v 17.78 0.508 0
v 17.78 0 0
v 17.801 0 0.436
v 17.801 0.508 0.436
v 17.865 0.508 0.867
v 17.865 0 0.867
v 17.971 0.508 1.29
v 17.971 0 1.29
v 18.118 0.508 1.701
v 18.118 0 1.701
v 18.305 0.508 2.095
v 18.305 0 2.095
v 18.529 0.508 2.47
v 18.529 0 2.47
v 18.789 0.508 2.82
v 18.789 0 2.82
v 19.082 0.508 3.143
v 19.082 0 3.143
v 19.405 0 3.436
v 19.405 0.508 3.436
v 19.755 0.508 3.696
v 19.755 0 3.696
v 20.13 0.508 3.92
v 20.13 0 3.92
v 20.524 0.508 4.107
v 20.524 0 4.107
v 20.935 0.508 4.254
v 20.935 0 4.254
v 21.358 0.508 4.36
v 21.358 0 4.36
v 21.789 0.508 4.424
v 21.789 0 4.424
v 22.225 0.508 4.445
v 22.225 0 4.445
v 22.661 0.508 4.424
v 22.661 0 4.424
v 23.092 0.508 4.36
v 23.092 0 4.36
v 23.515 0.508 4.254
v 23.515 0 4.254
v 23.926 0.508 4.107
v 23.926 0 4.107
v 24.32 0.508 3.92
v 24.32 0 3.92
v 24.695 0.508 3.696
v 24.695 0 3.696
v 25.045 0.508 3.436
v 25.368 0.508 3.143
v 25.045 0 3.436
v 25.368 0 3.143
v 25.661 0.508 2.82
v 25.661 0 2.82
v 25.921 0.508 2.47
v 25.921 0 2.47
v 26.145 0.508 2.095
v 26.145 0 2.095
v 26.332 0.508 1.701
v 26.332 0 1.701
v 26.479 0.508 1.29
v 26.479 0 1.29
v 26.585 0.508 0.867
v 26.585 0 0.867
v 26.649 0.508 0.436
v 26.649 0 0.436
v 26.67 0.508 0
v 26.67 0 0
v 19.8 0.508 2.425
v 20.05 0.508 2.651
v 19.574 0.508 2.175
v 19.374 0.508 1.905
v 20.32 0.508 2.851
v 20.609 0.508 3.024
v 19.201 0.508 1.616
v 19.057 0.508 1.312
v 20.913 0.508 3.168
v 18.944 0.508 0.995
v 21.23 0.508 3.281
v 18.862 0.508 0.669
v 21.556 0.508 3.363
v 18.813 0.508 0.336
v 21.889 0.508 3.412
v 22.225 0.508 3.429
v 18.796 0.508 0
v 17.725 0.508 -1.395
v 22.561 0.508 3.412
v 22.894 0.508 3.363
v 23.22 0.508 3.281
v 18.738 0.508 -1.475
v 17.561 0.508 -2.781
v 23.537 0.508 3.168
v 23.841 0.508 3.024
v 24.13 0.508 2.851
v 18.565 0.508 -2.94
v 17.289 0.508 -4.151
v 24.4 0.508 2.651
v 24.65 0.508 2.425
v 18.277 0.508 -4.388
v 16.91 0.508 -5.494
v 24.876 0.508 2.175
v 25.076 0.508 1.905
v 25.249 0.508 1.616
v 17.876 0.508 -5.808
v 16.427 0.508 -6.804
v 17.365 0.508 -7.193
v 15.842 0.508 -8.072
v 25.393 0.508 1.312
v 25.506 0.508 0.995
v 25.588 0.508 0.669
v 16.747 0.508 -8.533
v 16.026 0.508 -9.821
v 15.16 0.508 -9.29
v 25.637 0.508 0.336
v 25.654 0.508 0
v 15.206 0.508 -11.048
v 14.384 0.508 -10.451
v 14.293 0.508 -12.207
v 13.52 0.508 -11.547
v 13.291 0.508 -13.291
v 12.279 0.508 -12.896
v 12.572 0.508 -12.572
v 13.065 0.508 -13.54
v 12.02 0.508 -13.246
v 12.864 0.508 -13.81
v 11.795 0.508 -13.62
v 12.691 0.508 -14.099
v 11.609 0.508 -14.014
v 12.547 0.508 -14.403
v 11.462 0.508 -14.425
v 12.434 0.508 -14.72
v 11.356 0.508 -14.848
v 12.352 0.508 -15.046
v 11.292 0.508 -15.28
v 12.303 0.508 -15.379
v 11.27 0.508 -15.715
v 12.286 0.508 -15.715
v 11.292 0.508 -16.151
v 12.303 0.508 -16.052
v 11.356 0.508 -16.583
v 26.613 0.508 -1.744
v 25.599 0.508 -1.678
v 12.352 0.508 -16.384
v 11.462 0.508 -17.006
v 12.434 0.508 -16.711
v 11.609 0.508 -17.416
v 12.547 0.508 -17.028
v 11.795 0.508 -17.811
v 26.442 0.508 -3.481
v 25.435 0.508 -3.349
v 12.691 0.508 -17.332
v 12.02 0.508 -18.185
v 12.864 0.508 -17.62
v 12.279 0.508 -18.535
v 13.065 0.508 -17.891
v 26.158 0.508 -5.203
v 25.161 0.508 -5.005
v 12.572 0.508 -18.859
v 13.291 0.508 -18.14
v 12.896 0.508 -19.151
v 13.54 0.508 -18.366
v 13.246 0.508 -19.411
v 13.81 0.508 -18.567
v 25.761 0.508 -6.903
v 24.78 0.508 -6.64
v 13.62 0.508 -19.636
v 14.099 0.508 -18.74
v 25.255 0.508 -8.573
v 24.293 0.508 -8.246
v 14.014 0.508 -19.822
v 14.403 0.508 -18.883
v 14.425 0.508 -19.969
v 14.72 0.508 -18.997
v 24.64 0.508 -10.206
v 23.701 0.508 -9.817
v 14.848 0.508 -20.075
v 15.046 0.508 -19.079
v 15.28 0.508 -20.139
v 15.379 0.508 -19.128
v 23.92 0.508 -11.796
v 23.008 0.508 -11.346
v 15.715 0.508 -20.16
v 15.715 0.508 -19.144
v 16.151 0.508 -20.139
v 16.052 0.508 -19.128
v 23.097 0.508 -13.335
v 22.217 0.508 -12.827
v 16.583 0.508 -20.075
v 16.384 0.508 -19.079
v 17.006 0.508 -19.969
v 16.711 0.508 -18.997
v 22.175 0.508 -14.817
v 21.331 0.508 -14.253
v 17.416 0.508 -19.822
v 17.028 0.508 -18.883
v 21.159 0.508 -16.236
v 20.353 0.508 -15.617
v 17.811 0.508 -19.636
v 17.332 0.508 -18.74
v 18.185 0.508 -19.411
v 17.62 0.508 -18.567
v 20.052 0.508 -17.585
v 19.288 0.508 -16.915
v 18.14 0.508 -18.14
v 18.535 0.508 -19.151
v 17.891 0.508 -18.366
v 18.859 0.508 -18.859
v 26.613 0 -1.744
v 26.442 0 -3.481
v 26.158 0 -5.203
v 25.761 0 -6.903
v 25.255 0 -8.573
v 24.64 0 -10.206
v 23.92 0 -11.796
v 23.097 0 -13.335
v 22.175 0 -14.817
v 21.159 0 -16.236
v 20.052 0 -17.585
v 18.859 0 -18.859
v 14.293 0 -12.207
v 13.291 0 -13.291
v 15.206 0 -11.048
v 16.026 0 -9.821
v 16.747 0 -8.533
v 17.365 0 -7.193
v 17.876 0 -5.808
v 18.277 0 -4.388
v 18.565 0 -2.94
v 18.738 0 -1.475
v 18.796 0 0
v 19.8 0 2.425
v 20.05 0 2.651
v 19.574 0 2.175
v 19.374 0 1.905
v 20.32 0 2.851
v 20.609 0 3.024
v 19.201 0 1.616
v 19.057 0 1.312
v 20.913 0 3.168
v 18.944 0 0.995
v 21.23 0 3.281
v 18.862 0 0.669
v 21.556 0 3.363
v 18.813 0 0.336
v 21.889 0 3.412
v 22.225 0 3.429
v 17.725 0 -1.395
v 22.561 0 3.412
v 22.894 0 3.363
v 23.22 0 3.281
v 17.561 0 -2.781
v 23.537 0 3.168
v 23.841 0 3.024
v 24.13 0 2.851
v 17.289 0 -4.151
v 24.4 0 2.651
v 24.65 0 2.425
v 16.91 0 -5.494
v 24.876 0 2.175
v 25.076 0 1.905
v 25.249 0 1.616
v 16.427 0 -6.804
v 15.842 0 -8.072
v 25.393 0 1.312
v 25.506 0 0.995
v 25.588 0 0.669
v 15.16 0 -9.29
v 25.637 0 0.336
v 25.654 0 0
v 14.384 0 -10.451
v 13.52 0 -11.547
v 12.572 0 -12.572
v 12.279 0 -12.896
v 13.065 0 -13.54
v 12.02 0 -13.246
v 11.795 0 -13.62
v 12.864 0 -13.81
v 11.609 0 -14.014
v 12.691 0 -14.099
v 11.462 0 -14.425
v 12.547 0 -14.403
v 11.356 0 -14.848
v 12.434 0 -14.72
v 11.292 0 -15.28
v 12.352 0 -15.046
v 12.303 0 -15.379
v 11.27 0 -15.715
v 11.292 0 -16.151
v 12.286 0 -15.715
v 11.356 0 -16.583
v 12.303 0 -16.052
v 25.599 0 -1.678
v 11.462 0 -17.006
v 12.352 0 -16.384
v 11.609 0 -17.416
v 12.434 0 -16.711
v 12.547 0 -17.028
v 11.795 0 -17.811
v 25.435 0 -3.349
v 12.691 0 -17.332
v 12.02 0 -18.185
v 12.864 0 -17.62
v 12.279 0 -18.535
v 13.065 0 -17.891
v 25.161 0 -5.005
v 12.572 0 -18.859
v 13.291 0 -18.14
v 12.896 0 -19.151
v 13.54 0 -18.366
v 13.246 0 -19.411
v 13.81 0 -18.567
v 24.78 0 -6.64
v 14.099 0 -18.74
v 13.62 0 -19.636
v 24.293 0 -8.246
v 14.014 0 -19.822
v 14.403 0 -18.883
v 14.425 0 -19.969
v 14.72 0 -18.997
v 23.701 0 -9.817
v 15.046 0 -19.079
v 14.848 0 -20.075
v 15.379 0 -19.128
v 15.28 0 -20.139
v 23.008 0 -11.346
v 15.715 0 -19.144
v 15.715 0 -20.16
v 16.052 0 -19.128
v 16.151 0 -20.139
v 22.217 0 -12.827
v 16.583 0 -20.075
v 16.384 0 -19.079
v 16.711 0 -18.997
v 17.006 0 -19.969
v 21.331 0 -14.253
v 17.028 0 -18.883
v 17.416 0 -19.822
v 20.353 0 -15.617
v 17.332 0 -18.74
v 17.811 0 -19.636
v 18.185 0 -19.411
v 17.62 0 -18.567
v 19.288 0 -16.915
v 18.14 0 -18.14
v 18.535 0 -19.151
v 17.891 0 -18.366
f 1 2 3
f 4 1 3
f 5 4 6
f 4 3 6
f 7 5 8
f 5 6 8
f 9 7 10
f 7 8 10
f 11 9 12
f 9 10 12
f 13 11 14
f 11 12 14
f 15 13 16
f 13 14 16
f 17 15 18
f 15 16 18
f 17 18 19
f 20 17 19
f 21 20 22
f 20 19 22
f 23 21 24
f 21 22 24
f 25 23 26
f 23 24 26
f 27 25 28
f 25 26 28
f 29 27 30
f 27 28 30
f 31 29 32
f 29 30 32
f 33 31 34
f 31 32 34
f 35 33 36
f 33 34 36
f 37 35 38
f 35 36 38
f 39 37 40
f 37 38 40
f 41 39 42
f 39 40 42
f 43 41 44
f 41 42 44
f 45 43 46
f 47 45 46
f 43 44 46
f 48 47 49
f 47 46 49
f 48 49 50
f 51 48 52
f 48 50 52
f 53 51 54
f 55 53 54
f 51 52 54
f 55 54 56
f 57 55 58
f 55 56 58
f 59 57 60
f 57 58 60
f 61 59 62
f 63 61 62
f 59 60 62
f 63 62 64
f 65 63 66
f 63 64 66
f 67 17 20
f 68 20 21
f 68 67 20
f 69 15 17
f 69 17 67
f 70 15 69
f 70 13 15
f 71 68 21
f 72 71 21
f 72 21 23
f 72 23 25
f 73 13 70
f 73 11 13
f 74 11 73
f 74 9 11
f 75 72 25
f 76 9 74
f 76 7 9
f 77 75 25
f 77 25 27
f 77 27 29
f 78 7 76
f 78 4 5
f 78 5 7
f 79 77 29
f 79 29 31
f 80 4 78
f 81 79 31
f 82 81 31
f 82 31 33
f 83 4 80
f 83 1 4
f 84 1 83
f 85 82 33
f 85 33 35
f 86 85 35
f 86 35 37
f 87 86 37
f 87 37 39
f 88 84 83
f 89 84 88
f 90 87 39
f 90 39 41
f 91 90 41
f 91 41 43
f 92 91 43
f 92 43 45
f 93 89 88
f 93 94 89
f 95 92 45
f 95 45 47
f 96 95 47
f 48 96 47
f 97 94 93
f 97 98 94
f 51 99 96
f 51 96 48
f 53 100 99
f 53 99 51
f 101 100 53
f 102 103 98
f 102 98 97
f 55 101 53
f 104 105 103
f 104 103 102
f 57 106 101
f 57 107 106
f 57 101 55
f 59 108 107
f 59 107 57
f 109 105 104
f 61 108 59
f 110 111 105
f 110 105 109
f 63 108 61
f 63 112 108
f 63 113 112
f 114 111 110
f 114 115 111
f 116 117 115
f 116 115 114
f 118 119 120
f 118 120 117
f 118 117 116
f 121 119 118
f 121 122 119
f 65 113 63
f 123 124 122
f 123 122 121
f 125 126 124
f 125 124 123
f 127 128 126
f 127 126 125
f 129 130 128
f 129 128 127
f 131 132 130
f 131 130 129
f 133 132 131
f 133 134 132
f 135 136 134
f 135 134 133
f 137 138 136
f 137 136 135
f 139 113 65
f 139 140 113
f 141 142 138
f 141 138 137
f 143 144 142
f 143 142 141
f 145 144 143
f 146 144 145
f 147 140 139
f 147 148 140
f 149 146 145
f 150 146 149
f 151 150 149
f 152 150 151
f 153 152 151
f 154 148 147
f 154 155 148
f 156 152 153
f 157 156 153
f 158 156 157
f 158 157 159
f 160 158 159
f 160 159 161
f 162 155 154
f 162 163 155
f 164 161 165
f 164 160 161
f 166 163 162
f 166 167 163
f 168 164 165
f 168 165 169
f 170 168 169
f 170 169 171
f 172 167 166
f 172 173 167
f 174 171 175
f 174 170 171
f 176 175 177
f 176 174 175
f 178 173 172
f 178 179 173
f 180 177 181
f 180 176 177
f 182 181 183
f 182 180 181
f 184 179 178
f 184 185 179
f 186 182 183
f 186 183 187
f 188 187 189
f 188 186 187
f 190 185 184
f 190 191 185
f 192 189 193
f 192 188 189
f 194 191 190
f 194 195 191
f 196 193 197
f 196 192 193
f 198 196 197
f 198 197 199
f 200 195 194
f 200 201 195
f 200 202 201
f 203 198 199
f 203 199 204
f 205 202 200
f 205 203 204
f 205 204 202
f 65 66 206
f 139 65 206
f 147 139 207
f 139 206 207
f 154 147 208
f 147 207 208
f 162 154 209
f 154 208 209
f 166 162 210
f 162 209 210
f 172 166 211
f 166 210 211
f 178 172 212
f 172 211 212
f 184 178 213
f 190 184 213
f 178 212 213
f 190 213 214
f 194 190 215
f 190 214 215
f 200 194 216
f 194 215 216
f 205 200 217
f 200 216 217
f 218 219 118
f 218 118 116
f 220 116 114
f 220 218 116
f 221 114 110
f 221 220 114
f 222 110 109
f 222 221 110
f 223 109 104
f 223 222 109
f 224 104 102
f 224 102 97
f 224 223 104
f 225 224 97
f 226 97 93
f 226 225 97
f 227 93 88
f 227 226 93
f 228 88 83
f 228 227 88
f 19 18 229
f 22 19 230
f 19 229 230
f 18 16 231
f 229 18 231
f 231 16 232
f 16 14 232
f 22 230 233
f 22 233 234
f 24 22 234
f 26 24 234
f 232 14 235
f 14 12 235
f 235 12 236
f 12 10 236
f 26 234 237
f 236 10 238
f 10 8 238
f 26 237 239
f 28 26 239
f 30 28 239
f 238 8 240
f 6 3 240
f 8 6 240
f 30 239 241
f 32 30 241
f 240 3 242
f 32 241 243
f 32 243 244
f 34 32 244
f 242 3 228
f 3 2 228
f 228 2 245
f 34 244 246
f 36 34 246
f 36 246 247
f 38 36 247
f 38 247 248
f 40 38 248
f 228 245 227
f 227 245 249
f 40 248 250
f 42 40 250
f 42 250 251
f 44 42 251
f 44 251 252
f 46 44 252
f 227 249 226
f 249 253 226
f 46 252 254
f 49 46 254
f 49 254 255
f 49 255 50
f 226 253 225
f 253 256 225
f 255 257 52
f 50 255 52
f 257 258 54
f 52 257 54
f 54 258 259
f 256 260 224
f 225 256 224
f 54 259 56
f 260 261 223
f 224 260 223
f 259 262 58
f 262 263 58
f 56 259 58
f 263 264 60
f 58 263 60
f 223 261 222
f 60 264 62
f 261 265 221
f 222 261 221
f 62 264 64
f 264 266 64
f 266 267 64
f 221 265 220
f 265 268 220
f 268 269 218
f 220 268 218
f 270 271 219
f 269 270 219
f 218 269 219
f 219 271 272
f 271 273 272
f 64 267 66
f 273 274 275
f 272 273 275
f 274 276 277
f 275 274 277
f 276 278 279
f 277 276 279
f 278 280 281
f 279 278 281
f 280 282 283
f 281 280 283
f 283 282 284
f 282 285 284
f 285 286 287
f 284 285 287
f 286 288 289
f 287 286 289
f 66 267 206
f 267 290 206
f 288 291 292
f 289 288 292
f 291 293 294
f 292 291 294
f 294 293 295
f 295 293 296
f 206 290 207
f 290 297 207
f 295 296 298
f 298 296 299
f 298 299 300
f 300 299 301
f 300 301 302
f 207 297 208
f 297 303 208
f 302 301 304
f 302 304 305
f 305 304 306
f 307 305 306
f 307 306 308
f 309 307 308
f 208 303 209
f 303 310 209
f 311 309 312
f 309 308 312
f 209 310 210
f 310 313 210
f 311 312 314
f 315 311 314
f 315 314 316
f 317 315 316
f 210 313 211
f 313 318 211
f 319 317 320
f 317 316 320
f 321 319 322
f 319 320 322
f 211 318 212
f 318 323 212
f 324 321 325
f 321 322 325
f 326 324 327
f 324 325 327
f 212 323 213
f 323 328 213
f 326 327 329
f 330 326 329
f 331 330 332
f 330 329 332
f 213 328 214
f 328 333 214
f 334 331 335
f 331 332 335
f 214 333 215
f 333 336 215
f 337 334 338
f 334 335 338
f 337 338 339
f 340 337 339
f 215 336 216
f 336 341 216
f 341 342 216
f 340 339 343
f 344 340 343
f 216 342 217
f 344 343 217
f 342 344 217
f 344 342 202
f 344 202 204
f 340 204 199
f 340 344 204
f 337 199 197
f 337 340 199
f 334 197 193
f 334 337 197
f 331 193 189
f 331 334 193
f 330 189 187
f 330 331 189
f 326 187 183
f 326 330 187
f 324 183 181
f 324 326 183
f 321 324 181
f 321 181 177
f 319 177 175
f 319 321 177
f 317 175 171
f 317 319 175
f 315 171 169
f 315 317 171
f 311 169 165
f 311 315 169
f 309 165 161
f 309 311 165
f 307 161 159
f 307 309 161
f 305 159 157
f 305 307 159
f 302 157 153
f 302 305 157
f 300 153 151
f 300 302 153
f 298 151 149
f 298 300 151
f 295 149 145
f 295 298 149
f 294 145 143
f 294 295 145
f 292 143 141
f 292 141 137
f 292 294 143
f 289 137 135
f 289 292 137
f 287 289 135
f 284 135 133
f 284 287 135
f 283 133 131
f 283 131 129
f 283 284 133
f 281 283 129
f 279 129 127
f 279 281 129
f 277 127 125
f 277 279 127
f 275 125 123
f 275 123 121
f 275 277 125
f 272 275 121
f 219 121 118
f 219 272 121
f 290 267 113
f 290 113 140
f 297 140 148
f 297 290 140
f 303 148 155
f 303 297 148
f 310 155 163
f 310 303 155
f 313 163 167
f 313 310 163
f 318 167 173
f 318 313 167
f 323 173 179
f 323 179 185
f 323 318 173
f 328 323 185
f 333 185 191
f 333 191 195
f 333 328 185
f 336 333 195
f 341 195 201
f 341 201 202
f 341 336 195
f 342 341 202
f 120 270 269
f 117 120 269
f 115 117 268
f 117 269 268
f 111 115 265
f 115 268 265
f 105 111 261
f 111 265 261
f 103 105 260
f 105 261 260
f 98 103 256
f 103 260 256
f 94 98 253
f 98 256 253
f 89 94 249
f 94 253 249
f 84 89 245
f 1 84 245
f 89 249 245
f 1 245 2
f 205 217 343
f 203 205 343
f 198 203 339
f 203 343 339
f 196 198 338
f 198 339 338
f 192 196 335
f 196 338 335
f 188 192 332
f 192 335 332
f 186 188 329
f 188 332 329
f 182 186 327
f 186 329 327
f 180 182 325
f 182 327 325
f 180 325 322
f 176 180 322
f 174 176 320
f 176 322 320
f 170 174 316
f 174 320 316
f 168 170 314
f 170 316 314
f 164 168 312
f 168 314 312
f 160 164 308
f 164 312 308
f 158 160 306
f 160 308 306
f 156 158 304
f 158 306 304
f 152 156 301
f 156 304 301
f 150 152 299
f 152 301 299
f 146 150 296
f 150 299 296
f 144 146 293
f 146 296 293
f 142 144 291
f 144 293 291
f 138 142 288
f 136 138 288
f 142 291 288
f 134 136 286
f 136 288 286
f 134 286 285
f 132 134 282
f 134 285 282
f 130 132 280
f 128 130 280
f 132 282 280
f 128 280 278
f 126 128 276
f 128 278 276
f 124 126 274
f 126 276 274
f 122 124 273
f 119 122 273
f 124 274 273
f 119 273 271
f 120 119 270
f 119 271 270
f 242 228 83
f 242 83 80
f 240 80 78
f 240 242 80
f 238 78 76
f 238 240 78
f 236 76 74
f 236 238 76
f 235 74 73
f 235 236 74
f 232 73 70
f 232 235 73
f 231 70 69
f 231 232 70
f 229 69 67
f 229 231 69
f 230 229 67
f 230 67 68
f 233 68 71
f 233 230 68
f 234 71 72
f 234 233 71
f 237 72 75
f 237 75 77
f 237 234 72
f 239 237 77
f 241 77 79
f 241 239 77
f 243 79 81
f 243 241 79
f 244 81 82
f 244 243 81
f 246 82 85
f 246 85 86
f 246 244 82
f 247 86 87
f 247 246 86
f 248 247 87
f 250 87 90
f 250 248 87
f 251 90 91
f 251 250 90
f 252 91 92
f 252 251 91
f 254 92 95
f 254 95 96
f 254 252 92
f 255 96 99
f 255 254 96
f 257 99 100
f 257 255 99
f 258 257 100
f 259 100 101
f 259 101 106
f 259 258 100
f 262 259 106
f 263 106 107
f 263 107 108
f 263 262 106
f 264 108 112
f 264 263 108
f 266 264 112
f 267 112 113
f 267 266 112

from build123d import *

# Parameters (mm, degrees)
BOSS_EXTRUDE1_DEPTH = 0.508


with BuildPart() as part:
    # Sketch1 → Boss-Extrude1 (new body)
    with BuildSketch(Plane(origin=(0, 0, 0), x_dir=(1, 0, 0), z_dir=(0, 1, 0))):
        with BuildLine():
            ThreePointArc((26.67, 0), (24.639867132, 10.206167141), (18.858537854, 18.858537854))
            ThreePointArc((18.858537854, 18.858537854), (12.572358569, 18.858537854), (12.572358569, 12.572358569))
            ThreePointArc((12.572358569, 12.572358569), (16.426578088, 6.804111427), (17.78, 0))
            ThreePointArc((17.78, 0), (22.225, -4.445), (26.67, 0))
        make_face()
        with BuildLine():
            ThreePointArc((25.654, 0), (23.701205527, 9.817360774), (18.140117365, 18.140117365))
            ThreePointArc((18.140117365, 18.140117365), (13.290779059, 18.140117365), (13.290779059, 13.290779059))
            ThreePointArc((13.290779059, 13.290779059), (17.365239693, 7.192917795), (18.796, 0))
            ThreePointArc((18.796, 0), (22.225, -3.429), (25.654, 0))
        make_face(mode=Mode.SUBTRACT)
    extrude(amount=BOSS_EXTRUDE1_DEPTH)


solid = part.part
